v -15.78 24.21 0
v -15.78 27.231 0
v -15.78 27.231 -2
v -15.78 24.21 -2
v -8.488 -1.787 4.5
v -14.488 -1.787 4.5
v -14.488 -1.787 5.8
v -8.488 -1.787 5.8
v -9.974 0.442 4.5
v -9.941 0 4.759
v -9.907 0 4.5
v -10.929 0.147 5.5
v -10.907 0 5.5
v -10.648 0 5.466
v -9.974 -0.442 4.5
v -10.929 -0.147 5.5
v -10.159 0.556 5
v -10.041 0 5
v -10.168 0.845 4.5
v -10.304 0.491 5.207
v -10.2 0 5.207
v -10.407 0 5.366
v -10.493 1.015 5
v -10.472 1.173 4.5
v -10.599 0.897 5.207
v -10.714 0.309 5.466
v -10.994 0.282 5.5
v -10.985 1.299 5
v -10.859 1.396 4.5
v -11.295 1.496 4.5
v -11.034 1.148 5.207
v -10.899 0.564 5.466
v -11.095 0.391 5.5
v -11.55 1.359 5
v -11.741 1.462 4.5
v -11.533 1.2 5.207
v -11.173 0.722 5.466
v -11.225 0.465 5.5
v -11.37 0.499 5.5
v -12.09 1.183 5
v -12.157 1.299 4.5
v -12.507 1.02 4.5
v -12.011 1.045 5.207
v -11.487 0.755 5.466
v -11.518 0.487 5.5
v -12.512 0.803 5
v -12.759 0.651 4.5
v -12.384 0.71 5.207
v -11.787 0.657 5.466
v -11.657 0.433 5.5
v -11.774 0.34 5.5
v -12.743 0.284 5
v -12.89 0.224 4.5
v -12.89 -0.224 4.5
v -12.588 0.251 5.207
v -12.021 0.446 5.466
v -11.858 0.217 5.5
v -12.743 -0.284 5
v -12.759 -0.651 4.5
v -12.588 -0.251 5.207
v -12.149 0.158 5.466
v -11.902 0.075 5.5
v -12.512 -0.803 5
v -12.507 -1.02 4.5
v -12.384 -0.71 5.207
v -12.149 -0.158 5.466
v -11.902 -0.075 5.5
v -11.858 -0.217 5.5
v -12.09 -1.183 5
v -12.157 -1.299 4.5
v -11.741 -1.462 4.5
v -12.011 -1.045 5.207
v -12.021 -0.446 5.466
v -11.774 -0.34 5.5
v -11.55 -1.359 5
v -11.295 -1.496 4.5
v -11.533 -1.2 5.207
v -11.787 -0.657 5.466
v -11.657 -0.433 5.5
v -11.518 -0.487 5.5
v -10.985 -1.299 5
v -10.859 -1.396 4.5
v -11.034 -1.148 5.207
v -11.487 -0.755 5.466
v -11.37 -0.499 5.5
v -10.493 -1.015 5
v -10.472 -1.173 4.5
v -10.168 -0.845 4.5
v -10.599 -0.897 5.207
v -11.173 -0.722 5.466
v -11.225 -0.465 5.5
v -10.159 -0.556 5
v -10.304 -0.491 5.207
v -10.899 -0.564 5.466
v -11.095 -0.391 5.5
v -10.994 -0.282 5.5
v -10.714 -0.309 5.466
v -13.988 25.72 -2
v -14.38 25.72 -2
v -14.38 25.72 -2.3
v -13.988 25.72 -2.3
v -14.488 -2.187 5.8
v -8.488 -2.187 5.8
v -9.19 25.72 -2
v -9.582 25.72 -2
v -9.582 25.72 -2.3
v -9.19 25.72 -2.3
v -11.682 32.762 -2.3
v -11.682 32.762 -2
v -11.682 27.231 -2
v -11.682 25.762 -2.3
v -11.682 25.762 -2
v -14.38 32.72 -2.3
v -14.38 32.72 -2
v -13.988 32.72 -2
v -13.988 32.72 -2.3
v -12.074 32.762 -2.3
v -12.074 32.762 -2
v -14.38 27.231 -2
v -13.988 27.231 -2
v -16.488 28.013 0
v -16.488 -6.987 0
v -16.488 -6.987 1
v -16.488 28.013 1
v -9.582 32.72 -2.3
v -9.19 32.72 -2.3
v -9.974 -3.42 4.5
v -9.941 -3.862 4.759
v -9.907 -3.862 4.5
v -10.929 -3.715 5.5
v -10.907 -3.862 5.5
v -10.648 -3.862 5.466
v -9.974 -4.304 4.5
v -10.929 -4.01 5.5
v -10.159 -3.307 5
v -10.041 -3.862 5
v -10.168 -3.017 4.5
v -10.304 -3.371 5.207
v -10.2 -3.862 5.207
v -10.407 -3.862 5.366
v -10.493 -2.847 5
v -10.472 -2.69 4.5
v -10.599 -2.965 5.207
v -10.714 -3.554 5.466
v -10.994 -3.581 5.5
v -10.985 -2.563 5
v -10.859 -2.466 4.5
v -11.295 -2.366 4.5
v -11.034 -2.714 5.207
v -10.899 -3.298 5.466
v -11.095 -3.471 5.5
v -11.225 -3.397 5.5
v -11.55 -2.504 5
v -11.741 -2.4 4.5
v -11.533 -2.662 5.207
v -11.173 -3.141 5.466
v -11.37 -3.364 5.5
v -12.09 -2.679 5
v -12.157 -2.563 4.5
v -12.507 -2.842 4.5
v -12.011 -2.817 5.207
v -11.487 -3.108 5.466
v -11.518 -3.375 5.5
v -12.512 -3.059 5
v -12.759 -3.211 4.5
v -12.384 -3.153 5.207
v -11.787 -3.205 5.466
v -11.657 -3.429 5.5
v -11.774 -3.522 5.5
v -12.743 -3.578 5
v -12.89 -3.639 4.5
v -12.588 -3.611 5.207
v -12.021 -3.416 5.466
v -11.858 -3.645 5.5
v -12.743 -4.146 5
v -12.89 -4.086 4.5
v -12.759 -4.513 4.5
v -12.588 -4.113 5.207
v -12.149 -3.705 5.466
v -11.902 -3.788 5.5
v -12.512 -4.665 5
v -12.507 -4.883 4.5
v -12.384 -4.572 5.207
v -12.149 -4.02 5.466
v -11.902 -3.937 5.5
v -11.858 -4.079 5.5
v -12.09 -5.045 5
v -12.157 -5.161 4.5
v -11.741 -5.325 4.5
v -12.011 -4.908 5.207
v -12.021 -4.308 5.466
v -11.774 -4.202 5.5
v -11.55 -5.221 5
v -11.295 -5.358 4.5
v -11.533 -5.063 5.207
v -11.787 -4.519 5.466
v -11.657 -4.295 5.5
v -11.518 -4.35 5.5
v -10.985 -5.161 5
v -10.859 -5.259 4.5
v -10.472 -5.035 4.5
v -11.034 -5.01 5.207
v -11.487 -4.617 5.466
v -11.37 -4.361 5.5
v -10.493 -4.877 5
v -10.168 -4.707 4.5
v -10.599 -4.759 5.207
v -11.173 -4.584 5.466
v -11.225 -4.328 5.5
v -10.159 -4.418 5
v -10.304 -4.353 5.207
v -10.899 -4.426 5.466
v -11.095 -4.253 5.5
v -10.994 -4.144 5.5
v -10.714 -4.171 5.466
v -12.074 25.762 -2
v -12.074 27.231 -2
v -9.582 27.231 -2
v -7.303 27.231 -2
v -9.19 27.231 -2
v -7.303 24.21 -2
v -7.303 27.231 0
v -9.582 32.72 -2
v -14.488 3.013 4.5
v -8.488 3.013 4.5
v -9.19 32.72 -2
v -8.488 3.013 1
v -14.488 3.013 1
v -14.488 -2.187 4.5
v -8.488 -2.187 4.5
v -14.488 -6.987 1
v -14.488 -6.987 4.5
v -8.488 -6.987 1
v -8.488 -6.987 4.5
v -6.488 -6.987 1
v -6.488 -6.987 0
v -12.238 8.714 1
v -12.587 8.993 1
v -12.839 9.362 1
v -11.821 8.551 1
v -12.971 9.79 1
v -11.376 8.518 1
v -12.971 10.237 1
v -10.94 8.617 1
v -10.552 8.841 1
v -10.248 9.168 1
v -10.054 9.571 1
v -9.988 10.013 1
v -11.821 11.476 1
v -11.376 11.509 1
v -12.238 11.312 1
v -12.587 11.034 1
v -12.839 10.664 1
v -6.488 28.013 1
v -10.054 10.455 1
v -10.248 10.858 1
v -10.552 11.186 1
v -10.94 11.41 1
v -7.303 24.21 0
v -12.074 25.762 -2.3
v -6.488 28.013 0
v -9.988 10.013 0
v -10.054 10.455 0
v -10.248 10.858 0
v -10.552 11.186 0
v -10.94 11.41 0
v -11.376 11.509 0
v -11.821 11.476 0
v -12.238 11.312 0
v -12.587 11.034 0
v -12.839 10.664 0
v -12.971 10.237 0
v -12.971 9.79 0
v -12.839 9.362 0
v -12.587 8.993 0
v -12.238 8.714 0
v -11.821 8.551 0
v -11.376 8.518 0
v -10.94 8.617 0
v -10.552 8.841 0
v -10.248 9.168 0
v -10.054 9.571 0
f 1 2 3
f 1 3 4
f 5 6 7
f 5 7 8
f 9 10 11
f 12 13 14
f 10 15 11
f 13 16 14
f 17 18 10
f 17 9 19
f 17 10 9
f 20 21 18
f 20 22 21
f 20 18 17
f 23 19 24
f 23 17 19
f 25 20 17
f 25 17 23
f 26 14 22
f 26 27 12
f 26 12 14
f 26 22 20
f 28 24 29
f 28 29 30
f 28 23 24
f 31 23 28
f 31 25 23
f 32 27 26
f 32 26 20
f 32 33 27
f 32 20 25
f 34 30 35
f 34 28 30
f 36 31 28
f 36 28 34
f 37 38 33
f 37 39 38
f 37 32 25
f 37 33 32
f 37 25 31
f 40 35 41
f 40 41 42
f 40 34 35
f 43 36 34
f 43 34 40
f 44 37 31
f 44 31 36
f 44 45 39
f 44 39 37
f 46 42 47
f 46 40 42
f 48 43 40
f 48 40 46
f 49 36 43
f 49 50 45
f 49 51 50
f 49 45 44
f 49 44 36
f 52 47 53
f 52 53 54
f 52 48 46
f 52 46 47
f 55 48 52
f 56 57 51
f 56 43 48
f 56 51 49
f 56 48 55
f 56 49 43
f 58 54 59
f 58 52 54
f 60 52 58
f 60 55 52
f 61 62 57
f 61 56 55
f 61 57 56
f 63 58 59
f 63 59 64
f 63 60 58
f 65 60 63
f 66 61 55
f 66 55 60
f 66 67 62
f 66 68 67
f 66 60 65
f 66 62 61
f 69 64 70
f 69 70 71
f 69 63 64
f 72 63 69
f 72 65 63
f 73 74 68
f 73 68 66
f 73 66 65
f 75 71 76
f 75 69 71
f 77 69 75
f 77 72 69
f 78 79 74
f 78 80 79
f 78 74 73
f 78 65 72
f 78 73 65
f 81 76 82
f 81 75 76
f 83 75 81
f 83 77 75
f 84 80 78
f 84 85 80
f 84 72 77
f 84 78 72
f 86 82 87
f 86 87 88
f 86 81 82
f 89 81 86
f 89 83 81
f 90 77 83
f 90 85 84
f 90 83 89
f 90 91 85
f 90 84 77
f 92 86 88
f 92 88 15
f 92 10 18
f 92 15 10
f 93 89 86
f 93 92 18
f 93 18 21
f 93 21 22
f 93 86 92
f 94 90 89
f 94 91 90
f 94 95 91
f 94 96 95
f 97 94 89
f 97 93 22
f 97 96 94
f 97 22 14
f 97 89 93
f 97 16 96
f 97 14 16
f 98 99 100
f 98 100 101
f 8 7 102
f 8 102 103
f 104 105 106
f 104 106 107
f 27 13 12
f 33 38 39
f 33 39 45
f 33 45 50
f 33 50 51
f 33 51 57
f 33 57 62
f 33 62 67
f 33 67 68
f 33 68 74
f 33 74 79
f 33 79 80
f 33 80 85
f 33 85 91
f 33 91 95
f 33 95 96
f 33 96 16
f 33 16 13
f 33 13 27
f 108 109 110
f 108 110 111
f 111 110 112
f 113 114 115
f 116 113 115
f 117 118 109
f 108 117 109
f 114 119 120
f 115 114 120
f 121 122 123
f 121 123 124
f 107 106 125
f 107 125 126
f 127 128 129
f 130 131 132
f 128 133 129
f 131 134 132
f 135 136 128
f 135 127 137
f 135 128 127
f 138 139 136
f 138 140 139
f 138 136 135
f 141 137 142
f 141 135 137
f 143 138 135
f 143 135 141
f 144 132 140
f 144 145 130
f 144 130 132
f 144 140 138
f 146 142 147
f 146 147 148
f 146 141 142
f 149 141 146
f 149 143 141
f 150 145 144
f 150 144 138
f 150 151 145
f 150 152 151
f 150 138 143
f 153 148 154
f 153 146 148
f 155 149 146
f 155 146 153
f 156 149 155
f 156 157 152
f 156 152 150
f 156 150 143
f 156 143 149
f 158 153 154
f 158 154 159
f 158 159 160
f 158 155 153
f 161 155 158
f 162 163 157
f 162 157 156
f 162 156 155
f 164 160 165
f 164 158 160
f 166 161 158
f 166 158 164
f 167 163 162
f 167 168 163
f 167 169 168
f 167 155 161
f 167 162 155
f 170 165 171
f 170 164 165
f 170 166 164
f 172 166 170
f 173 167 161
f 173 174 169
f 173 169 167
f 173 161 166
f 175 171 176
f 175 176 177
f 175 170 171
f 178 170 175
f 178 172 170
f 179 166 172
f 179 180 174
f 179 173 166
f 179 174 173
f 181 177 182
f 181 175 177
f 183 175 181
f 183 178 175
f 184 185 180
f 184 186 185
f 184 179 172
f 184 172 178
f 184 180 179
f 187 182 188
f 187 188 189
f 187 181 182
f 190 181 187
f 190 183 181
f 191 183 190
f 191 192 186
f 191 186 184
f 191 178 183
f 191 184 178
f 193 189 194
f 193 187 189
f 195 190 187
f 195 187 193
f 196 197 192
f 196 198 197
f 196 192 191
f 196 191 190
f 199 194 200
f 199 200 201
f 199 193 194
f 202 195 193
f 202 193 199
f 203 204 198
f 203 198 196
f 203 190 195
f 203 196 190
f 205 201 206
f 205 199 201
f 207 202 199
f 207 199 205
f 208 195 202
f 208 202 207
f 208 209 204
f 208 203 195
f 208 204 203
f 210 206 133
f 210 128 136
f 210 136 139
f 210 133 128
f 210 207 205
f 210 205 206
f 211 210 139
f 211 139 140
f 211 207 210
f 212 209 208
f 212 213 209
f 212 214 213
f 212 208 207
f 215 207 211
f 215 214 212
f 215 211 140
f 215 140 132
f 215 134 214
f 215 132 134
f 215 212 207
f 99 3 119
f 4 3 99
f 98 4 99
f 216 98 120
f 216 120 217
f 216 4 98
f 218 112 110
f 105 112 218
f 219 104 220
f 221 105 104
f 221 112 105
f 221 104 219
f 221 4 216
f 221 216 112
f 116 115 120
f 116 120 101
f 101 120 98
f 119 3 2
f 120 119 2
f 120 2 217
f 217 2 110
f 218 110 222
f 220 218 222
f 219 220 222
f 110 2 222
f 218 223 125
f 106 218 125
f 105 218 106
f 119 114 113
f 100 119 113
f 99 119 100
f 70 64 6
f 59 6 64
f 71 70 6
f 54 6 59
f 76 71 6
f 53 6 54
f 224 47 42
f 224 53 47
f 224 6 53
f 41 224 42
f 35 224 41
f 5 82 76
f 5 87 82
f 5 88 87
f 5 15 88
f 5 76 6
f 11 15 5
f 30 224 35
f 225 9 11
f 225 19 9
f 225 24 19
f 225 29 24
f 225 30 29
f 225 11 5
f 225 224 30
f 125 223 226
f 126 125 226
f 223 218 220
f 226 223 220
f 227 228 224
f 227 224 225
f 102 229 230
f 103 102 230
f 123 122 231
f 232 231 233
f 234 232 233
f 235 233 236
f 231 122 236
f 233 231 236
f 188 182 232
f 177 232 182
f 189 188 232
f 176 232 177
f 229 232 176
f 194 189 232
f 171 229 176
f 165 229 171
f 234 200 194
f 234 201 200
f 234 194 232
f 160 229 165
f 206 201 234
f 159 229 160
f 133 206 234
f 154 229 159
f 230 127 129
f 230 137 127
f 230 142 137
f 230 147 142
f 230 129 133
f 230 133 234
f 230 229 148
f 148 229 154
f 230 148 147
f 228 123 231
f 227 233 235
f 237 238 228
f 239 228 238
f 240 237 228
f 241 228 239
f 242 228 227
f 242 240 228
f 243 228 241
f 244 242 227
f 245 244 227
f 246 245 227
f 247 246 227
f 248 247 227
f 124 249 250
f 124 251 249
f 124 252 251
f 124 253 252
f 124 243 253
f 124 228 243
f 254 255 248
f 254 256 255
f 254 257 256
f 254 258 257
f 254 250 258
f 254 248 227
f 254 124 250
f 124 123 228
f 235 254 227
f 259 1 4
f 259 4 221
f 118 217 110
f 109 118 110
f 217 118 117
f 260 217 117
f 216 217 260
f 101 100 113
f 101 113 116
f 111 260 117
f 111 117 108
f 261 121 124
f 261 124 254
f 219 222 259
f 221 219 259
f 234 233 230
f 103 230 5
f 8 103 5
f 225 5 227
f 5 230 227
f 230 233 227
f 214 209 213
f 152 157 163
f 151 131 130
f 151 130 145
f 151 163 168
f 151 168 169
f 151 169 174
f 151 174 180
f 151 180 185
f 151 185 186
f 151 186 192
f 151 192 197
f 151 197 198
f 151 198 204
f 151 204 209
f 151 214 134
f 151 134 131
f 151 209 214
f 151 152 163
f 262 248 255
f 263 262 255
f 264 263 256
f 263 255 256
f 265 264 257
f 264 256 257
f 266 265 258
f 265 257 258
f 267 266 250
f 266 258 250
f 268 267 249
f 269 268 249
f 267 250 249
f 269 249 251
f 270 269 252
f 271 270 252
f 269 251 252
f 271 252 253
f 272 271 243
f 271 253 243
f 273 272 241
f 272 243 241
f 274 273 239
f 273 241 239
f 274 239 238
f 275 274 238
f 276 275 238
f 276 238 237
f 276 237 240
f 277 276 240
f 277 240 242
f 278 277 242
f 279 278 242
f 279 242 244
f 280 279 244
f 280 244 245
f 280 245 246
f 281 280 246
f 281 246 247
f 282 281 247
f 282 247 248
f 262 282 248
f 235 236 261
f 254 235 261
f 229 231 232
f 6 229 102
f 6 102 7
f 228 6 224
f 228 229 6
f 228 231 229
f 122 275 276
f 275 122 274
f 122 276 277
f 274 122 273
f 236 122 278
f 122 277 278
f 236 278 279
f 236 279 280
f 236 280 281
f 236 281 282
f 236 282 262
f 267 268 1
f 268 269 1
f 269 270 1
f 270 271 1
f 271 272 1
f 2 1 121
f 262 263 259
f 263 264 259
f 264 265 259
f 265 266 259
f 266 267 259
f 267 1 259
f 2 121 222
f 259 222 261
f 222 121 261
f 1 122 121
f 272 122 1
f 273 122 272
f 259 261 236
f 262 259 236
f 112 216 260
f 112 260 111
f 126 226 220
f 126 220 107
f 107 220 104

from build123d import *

# Parameters (mm, degrees)
F0_W      = 10
F0_H      = 35
F1_DEPTH  = 1
F2_W      = 6
F2_H      = 10
F3_DEPTH  = 3.5
F4_R      = 1.5
F5_DEPTH  = 1
F6_W      = 8.476907853
F6_H      = 3.0214712024
F7_DEPTH  = 2
F8_W      = 0.392
F8_H      = 7
F9_DEPTH  = 0.3
F10_R     = 1.5
F11_DEPTH = 3.301
F12_R     = 0.99999
F13_W     = 6
F13_H     = 0.4
F14_DEPTH = 1.3


# Not quite as in the source:
# - a fillet or chamfer is up to 0.001 mm smaller than in the source, because OpenCascade refuses the exact size


with BuildPart() as f1:
    # F0 (on Top) → F1 (new body)
    with BuildSketch(Plane.XY):
        with Locations((-11.4876428805, 10.5133079179)):
            Rectangle(F0_W, F0_H)
    extrude(amount=F1_DEPTH)

    # F2 (on face) → F3 (join)
    with BuildSketch(Plane.XY.offset(1)):
        with Locations((-11.4876428805, -1.9866920821)):
            Rectangle(F2_W, F2_H)
    extrude(amount=F3_DEPTH)

    # F4 (on face) → F5 (join)
    with BuildSketch(Plane.XY.offset(4.5)):
        with Locations((-11.4072084332, 0)):
            Circle(F4_R)
        with Locations((-11.4072084332, -3.8623050655)):
            Circle(F4_R)
    extrude(amount=F5_DEPTH)

    # F6 (on face) → F7 (join)
    with BuildSketch(Plane(origin=(0, 0, 0), x_dir=(1, 0, 0), z_dir=(0, 0, -1))):
        with Locations((-11.5416448098, -25.7204081863)):
            Rectangle(F6_W, F6_H)
    extrude(amount=F7_DEPTH)

    # F8 (on face) → F9 (join)
    with BuildSketch(Plane(origin=(0, 0, -2), x_dir=(1, 0, 0), z_dir=(0, 0, -1))):
        with Locations((-14.1843358078, -29.2204081863)):
            Rectangle(F8_W, F8_H)
        with Locations((-11.8782826397, -29.261767303)):
            Rectangle(F8_W, F8_H)
        with Locations((-9.3856059038, -29.2204081863)):
            Rectangle(F8_W, F8_H)
    extrude(amount=F9_DEPTH)

    # F10 (on face) → F11 (cut, through all)
    with BuildSketch(Plane.XY.offset(1)):
        with Locations((-11.4876428805, 10.0133079179)):
            Circle(F10_R)
    extrude(amount=-F11_DEPTH, mode=Mode.SUBTRACT)

    # F12 (radius 1 in the source; OpenCascade refuses exactly that, so slightly less here)
    f12_edges = [f1.edges().sort_by_distance(p)[0] for p in [
        (-12.907208, -3.862305, 5.5),
        (-12.907208, 0, 5.5),
    ]]
    fillet(f12_edges, radius=F12_R)

    # F13 (on face) → F14 (join)
    with BuildSketch(Plane.XY.offset(4.5)):
        with Locations((-11.4876428805, -1.9866920821)):
            Rectangle(F13_W, F13_H)
    extrude(amount=F14_DEPTH)


solid = f1.part
